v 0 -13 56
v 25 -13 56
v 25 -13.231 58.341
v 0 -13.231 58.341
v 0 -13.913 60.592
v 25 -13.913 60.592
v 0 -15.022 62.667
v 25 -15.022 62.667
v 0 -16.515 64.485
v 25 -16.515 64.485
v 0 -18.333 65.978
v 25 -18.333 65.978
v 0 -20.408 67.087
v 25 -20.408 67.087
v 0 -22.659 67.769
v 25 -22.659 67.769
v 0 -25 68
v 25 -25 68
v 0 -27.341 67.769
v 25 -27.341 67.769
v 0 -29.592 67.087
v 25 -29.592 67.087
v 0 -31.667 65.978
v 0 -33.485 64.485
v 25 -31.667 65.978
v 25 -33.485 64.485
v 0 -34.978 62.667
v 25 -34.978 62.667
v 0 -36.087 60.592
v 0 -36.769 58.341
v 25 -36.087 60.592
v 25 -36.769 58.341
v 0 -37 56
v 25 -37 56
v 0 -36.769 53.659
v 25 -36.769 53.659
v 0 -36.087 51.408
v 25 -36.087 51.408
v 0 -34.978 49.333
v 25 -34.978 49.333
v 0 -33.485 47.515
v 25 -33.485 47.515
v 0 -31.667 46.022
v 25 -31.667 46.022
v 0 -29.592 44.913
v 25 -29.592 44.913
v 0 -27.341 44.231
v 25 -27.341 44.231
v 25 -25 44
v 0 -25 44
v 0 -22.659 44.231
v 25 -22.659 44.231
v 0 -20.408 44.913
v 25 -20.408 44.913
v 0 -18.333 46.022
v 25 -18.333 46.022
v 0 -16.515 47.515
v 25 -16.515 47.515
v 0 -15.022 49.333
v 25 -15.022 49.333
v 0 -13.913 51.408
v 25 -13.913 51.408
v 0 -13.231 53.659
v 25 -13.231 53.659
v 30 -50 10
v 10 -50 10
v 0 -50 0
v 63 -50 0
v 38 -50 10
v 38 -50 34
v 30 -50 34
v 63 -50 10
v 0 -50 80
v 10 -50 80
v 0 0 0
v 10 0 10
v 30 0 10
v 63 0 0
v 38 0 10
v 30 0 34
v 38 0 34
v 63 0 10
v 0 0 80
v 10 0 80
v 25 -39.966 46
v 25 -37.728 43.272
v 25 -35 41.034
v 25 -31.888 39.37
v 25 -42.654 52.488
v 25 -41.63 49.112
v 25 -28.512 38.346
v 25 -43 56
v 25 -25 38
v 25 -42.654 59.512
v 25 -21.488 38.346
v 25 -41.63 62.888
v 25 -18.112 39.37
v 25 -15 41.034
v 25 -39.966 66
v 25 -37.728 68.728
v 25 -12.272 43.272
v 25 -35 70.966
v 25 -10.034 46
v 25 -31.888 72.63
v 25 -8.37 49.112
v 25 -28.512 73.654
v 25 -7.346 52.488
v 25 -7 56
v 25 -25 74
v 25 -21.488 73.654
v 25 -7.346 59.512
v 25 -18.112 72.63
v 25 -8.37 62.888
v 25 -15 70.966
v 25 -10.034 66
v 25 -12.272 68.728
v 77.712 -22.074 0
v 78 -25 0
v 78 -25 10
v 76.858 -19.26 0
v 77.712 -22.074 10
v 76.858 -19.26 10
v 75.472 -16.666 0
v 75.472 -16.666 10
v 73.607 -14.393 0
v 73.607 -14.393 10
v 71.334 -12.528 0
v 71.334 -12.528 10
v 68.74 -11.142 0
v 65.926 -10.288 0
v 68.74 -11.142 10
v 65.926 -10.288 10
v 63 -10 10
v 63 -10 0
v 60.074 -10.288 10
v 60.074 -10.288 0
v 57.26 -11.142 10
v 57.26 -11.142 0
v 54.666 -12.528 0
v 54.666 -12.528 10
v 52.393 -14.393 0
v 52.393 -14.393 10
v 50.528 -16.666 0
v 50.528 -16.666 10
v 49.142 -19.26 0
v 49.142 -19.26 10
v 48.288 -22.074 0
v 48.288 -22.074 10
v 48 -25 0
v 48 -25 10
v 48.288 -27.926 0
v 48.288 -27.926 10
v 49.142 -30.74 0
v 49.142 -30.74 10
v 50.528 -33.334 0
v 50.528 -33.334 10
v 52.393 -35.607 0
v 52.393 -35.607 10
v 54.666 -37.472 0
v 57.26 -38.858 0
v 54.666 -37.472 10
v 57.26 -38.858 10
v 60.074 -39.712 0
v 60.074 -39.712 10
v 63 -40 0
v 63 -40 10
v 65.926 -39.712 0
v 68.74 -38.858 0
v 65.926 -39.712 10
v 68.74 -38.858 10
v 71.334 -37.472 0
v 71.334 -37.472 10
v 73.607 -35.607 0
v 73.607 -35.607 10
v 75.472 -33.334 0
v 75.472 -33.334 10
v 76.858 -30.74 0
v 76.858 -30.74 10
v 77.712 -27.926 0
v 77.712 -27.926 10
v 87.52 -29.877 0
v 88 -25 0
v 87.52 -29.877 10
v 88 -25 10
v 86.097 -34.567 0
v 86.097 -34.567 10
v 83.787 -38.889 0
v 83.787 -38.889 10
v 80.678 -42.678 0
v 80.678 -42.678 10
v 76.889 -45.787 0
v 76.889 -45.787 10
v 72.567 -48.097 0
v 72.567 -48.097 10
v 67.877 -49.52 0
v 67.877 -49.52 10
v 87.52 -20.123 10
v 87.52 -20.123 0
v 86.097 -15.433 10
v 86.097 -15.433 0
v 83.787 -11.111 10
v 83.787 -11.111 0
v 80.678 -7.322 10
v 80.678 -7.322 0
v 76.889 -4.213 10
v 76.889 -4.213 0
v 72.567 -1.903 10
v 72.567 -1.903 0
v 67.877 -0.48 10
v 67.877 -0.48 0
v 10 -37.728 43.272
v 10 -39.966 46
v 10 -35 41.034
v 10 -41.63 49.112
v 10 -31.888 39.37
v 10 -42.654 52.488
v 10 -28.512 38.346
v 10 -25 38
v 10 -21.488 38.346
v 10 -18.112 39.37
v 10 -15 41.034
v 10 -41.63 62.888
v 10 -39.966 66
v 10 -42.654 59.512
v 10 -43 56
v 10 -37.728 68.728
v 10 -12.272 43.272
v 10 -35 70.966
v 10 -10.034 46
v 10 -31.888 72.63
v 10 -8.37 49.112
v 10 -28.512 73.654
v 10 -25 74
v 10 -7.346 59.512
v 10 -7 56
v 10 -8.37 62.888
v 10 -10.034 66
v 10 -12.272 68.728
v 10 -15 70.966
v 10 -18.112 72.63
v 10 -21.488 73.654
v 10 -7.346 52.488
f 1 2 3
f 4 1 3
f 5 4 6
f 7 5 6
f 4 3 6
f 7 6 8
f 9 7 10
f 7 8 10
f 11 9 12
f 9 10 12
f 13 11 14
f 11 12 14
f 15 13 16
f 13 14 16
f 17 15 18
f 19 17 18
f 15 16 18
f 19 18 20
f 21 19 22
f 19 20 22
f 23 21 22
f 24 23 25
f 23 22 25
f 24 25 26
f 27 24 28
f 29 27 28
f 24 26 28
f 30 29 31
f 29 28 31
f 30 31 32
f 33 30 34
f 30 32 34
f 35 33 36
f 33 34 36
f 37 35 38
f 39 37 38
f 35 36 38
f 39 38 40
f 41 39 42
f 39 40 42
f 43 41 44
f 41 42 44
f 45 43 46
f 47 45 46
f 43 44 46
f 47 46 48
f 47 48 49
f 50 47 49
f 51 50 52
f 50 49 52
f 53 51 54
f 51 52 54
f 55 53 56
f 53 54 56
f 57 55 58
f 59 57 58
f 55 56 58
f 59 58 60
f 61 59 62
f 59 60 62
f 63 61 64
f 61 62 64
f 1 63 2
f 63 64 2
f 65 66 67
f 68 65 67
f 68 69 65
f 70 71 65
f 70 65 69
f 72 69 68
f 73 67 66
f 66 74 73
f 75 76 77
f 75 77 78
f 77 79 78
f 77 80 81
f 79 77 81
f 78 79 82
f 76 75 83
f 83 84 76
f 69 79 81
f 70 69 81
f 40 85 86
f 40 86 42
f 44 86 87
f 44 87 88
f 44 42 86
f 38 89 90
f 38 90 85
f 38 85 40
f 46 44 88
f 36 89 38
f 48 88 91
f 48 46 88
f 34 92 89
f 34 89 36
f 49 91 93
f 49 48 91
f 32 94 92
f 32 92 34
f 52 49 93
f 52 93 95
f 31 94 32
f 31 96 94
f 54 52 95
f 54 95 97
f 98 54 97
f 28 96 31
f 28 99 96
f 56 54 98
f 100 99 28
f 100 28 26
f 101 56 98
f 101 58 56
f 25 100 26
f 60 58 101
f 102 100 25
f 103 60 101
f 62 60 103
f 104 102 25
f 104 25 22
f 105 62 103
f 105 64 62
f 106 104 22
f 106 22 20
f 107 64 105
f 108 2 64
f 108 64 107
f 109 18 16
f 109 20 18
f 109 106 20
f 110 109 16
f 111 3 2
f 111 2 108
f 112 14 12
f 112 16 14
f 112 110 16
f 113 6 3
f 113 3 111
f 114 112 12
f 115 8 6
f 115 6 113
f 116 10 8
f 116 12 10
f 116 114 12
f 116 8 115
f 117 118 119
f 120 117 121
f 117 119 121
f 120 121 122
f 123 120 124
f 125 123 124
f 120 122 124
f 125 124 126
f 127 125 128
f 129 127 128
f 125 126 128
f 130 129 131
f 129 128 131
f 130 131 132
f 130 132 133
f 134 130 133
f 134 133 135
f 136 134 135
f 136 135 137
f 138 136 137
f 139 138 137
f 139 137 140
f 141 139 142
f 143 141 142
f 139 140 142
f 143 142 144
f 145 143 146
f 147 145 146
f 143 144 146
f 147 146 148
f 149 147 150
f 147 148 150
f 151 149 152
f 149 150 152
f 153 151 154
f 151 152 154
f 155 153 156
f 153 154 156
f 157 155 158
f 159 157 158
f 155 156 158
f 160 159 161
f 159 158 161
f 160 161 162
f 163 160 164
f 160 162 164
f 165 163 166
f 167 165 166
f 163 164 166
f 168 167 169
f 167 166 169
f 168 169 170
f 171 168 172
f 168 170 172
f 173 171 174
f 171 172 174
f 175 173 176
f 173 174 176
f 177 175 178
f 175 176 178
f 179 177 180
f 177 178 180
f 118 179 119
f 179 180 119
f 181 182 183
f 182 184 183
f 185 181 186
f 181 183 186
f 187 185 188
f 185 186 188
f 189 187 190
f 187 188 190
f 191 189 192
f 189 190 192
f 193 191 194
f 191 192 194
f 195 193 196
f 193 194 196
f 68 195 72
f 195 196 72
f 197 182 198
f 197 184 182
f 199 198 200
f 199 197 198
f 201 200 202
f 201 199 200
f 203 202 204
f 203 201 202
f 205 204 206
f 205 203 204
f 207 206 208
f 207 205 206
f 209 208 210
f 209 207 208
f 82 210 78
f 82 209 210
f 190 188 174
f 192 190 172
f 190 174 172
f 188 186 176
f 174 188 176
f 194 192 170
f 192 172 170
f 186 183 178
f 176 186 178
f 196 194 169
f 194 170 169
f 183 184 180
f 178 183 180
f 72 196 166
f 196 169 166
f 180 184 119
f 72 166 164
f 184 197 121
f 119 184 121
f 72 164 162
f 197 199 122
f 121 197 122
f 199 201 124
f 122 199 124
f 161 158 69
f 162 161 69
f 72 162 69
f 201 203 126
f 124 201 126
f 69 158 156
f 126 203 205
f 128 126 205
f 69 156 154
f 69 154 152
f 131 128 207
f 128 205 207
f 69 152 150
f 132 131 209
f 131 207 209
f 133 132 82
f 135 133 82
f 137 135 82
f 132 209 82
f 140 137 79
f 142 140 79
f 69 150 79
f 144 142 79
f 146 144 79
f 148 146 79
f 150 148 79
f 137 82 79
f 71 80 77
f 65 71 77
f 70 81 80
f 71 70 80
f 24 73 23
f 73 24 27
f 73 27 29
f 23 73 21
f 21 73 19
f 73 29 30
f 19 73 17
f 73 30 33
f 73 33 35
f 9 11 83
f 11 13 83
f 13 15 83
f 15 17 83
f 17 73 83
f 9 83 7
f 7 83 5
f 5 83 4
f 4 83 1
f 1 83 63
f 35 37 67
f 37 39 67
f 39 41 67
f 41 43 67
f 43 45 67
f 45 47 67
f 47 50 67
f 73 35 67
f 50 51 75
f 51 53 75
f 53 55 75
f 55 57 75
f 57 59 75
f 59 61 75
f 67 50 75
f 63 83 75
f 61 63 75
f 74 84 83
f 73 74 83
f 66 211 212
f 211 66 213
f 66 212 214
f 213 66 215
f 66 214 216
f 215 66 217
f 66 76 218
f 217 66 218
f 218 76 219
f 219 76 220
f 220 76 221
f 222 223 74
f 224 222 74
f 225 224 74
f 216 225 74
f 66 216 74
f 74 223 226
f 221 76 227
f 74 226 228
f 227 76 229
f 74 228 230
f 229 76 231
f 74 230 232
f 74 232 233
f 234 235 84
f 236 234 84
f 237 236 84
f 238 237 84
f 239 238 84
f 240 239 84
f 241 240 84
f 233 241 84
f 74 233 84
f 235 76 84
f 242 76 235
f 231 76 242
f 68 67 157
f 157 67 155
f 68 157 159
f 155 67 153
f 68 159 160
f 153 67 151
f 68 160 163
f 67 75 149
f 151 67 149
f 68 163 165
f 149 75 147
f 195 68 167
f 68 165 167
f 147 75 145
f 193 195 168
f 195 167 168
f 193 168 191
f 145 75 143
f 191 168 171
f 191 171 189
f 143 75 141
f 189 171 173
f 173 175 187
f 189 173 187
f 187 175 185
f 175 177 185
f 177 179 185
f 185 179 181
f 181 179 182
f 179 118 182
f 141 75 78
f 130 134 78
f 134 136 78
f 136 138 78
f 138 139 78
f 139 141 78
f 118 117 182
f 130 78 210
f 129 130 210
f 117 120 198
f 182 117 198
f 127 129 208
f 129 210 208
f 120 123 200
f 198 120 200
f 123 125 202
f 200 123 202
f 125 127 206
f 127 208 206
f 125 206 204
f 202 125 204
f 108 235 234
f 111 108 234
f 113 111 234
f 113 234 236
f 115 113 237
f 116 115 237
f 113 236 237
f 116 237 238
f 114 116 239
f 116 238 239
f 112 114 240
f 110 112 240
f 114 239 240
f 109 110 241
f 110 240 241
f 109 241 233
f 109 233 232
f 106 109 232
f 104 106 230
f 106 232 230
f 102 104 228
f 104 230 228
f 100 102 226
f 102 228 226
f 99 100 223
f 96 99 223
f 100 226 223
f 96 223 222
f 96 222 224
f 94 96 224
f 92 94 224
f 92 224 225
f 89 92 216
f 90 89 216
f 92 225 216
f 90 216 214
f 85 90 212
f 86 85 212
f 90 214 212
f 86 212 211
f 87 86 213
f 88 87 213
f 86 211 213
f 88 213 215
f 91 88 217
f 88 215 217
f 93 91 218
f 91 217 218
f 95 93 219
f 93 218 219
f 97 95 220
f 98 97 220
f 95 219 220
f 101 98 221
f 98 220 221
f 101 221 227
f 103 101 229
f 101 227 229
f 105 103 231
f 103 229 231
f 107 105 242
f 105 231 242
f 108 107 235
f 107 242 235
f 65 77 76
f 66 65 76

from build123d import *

# Parameters (mm, degrees)
F1_DEPTH = 50
F2_R     = 25
F3_R     = 24.99999
F4_R     = 15
F5_DEPTH = 10
F6_R     = 18
F7_DEPTH = 15
F8_R     = 12
F9_DEPTH = 25


# Not quite as in the source:
# - a fillet or chamfer is up to 0.001 mm smaller than in the source, because OpenCascade refuses the exact size


with BuildPart() as f1:
    # F0 (on Front) → F1 (new body)
    with BuildSketch(Plane.XZ):
        Polygon((0, 80), (0, 0), (88, 0), (88, 10), (38, 10), (38, 34), (30, 34), (30, 10), (10, 10), (10, 80), align=None)
    extrude(amount=F1_DEPTH)

    # F2
    f2_edges = [f1.edges().sort_by_distance(p)[0] for p in [
        (88, -50, 5),
    ]]
    fillet(f2_edges, radius=F2_R)

    # F3 (radius 25 in the source; OpenCascade refuses exactly that, so slightly less here)
    f3_edges = [f1.edges().sort_by_distance(p)[0] for p in [
        (88, 0, 5),
    ]]
    fillet(f3_edges, radius=F3_R)

    # F4 (on face) → F5 (cut, through all)
    with BuildSketch(Plane.XY.offset(10)):
        with Locations((63, -25)):
            Circle(F4_R)
    extrude(amount=-F5_DEPTH, mode=Mode.SUBTRACT)

    # F6 (on face) → F7 (join)
    with BuildSketch(Plane.YZ.offset(10)):
        with Locations((-25, 56)):
            Circle(F6_R)
    extrude(amount=F7_DEPTH)

    # F8 (on face) → F9 (cut, through all)
    with BuildSketch(Plane.YZ.offset(25)):
        with Locations((-25, 56)):
            Circle(F8_R)
    extrude(amount=-F9_DEPTH, mode=Mode.SUBTRACT)


solid = f1.part
